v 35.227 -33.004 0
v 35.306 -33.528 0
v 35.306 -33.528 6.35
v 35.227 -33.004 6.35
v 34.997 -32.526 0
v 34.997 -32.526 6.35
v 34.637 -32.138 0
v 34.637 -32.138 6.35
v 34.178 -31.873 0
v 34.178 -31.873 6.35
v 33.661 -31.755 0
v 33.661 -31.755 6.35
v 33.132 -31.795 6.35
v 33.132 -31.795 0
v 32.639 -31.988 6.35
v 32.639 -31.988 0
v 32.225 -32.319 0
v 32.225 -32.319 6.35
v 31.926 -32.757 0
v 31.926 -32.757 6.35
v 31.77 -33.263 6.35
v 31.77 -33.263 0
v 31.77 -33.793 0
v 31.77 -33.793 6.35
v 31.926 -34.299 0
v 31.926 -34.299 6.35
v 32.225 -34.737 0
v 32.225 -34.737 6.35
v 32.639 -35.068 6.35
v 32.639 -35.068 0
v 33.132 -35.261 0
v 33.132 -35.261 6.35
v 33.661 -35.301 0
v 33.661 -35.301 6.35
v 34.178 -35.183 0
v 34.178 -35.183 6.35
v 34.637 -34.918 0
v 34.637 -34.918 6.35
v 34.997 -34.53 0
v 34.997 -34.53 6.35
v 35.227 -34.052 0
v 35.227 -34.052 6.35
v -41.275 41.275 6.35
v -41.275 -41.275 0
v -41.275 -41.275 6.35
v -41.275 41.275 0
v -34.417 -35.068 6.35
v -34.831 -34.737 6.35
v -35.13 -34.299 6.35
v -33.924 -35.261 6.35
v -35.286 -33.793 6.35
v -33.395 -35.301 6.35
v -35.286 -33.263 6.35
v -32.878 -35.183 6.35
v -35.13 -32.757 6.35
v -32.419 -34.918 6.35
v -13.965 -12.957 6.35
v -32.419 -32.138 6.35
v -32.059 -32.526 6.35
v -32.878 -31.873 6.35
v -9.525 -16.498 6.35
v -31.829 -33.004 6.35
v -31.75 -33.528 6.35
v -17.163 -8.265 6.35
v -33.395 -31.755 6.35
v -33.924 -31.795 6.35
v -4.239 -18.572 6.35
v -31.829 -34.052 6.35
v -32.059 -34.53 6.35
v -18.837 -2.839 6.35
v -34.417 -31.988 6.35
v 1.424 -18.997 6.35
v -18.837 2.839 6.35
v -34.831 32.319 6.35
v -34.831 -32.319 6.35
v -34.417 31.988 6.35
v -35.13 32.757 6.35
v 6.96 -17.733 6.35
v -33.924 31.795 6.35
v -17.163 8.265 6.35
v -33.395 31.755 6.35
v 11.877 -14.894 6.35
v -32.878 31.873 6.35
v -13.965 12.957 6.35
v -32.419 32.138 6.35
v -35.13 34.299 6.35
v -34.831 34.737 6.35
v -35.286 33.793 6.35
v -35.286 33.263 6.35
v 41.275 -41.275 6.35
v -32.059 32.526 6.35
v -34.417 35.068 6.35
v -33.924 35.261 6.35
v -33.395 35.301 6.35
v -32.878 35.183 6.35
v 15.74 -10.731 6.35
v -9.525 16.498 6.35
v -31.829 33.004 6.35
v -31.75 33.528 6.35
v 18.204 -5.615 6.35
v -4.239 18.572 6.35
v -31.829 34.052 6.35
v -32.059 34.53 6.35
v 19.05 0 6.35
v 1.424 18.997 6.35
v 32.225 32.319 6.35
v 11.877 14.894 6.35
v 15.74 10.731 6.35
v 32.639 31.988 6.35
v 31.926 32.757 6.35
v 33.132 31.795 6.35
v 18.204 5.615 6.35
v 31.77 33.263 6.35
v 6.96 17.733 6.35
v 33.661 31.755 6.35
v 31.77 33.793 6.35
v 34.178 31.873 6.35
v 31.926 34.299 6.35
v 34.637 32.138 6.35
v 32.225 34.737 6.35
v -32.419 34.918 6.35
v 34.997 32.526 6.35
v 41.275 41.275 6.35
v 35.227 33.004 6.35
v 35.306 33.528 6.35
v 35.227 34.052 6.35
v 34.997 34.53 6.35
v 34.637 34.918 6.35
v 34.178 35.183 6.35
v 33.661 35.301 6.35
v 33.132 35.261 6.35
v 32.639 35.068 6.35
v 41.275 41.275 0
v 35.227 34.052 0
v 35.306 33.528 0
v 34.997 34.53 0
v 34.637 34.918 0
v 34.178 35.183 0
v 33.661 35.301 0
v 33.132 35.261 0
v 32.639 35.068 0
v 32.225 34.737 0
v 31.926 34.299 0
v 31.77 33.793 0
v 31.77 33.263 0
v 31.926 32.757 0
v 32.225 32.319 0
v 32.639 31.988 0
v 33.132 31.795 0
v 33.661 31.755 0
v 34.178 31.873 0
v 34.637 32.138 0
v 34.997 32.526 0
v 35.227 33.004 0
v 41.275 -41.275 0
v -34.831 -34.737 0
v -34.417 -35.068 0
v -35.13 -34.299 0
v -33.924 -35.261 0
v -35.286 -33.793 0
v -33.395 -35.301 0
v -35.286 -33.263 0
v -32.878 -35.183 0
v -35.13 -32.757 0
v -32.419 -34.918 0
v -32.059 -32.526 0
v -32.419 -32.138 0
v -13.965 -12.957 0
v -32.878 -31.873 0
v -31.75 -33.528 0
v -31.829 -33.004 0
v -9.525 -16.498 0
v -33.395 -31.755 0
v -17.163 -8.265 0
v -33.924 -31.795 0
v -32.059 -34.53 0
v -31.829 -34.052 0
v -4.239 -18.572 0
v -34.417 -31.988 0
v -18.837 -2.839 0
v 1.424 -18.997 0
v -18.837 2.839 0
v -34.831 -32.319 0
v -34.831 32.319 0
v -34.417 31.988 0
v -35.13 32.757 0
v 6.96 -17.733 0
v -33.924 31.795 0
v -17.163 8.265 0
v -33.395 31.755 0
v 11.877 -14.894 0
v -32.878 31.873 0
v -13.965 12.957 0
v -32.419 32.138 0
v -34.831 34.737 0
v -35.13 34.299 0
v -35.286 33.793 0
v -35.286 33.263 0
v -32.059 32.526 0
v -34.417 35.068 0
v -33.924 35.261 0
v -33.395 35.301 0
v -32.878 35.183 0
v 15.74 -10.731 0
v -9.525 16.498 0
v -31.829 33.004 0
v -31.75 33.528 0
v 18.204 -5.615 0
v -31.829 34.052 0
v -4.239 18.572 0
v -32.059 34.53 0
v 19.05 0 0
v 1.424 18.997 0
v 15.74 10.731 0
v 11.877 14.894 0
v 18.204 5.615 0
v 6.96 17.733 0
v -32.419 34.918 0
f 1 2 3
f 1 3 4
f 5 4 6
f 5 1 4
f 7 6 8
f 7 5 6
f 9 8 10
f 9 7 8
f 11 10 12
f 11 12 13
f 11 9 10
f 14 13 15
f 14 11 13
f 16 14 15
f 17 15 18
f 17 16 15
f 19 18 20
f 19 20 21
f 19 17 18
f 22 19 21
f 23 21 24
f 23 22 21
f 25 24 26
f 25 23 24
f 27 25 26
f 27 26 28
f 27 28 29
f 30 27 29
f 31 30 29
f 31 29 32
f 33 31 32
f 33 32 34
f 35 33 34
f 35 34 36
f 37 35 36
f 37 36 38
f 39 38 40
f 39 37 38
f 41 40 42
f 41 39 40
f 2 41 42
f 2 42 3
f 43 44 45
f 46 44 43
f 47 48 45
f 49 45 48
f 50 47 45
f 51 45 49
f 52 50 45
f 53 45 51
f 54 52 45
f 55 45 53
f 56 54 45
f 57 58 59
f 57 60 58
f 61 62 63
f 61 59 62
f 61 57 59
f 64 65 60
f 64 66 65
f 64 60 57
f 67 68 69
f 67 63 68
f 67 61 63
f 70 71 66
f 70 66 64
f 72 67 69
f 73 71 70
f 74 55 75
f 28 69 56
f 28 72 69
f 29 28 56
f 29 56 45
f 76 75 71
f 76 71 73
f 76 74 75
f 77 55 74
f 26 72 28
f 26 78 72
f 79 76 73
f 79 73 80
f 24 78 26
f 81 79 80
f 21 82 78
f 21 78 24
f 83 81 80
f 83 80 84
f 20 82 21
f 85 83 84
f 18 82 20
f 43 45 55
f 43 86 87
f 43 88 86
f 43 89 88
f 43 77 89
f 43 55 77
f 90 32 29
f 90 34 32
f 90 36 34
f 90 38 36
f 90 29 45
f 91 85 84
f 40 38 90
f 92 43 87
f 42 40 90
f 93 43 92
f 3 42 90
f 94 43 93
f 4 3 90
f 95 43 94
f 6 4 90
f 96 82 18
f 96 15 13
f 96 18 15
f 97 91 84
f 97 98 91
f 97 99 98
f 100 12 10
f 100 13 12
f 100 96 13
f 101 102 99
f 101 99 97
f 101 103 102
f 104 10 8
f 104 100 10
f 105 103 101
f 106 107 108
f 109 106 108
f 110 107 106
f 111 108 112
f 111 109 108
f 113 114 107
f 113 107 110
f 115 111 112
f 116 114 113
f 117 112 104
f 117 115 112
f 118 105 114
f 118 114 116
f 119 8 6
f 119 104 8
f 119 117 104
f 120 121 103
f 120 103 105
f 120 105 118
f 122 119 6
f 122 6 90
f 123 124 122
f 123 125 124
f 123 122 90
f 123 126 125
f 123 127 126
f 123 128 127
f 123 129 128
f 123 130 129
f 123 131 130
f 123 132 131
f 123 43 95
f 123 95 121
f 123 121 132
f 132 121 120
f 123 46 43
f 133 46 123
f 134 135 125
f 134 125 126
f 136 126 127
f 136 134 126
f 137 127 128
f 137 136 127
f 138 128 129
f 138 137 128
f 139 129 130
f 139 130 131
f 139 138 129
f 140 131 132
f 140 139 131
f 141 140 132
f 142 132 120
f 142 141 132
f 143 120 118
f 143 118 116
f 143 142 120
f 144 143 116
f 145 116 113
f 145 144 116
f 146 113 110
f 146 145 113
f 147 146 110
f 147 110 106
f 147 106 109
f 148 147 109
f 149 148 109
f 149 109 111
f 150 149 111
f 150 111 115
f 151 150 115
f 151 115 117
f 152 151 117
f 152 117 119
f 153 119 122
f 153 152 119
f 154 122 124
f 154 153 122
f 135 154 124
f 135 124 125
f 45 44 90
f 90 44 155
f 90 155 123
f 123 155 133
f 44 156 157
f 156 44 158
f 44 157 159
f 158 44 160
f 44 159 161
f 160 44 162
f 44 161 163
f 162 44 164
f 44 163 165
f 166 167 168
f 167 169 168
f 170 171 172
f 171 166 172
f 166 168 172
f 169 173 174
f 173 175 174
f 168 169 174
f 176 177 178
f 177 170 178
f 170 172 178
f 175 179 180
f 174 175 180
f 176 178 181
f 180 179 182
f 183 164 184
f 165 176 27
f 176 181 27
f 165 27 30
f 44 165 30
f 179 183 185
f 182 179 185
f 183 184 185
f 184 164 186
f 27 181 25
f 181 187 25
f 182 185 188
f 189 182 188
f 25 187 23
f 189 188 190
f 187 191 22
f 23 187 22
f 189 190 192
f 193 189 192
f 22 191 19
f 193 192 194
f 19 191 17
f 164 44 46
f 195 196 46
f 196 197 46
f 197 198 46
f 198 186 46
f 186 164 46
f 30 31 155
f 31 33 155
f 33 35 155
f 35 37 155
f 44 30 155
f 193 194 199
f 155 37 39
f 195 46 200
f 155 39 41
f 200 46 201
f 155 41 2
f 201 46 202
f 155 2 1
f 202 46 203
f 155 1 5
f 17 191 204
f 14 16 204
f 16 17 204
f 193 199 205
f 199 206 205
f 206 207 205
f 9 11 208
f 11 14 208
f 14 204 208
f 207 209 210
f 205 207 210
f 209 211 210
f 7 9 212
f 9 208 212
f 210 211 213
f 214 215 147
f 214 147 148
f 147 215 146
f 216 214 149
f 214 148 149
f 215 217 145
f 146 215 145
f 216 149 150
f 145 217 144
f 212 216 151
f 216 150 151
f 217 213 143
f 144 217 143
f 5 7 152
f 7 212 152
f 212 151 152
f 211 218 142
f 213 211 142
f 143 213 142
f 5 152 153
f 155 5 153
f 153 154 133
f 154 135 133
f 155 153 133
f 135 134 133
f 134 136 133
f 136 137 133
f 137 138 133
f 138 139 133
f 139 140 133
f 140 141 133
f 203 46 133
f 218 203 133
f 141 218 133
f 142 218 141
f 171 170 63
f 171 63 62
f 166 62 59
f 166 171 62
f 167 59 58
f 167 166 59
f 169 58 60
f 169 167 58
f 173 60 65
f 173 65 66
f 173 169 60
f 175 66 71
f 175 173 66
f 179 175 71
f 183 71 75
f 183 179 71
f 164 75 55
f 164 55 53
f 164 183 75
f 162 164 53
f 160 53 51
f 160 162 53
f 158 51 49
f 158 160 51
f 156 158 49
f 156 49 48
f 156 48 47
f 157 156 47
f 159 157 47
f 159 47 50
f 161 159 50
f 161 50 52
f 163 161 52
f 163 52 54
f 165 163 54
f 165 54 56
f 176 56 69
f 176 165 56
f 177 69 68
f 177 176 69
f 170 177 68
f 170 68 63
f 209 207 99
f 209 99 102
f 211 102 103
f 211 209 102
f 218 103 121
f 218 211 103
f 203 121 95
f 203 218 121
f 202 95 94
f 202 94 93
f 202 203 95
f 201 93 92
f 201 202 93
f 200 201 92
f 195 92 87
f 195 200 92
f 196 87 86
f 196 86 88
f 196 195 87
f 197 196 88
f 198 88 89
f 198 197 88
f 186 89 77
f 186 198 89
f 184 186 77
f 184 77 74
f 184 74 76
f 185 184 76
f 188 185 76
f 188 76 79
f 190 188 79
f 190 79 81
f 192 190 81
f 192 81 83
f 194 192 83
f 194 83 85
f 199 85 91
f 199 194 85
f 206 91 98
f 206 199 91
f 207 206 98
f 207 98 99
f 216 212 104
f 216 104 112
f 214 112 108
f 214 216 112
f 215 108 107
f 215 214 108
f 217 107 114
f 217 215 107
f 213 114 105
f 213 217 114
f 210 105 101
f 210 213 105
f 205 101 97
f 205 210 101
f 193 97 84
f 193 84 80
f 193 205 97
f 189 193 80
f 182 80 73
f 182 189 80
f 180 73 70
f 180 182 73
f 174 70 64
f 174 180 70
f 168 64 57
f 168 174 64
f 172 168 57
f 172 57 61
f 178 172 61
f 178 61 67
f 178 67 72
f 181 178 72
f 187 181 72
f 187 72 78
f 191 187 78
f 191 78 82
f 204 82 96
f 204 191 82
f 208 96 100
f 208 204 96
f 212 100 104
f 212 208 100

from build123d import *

# Parameters (mm, degrees)
F0_W     = 82.55
F0_H     = 82.55
F0_R     = 1.778
F0_R_2   = 19.05
F1_DEPTH = 6.35


# Not quite as in the source:
# - a length typed as a fraction of an inch, garbled in the dataset ("3 / 203.2 mm" for 3/8 in), is restored


with BuildPart() as f1:
    # F0 (on Top) → F1 (new body)
    with BuildSketch(Plane.XY):
        Rectangle(F0_W, F0_H)
        with Locations((-33.528, -33.528)):
            Circle(F0_R, mode=Mode.SUBTRACT)
        with Locations((33.528, -33.528)):
            Circle(F0_R, mode=Mode.SUBTRACT)
        with Locations((-33.528, 33.528)):
            Circle(F0_R, mode=Mode.SUBTRACT)
        Circle(F0_R_2, mode=Mode.SUBTRACT)
        with Locations((33.528, 33.528)):
            Circle(F0_R, mode=Mode.SUBTRACT)
    extrude(amount=F1_DEPTH)


solid = f1.part
